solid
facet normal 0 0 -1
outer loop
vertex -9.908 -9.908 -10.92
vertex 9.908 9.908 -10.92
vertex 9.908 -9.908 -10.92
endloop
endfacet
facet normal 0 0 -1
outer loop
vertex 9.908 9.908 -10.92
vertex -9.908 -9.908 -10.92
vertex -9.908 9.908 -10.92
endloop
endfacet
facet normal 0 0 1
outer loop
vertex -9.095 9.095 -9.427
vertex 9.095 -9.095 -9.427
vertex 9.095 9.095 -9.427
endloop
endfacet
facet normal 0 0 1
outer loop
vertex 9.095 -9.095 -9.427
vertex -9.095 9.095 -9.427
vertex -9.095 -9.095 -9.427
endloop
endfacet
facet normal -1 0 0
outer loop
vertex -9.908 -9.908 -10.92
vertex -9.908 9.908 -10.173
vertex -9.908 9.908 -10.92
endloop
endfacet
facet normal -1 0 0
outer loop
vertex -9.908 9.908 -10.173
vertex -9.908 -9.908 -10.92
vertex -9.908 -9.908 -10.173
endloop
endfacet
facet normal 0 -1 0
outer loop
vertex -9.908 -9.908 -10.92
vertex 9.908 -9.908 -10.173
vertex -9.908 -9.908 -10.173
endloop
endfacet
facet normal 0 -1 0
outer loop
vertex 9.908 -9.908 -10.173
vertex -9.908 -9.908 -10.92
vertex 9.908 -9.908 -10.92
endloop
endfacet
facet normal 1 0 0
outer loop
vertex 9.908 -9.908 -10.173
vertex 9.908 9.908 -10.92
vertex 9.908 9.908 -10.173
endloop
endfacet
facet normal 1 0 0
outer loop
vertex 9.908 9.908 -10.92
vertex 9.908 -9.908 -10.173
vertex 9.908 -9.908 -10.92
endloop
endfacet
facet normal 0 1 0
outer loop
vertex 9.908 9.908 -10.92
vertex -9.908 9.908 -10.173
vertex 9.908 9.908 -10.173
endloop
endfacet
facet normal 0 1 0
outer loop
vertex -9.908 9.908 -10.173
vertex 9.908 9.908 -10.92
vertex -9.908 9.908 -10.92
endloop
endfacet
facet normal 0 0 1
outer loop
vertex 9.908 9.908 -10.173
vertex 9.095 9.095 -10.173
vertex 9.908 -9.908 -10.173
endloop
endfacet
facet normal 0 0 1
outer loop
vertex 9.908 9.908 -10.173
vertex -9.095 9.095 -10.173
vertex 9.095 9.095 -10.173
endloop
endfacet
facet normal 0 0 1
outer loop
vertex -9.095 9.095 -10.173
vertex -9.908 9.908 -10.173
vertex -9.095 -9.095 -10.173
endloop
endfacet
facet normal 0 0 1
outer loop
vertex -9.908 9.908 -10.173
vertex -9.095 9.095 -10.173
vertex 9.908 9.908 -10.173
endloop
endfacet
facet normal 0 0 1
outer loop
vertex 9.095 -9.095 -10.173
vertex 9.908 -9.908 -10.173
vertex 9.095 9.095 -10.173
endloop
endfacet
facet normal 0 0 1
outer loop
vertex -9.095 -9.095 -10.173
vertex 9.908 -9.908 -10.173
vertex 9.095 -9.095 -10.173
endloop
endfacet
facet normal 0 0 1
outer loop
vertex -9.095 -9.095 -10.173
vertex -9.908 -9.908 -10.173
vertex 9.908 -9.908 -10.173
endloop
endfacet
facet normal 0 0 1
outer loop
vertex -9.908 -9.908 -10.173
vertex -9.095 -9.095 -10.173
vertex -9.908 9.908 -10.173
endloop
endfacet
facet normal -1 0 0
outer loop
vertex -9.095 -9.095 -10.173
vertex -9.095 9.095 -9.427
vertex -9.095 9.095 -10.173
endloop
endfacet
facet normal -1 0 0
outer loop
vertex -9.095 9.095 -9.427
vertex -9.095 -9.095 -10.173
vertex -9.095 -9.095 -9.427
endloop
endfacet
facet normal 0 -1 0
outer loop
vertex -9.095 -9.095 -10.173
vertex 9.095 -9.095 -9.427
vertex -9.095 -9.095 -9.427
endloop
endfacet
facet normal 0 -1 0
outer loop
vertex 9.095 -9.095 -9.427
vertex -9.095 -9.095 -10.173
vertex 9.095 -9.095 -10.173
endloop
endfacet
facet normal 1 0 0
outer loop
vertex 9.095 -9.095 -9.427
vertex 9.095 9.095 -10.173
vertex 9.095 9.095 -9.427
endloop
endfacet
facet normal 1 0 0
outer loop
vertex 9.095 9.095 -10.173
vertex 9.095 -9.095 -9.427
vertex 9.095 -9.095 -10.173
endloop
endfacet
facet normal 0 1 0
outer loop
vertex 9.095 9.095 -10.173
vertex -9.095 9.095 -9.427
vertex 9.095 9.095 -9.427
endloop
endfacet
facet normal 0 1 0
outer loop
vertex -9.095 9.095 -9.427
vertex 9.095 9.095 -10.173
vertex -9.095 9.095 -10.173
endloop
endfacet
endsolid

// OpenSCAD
arete = 21.949;
paroi = 1.5;
echelleReductionAjustementBouchon = 0.96;
r = 0.19; // résolution d'impression sur l'axe Z

//cube_creux();
//decoupe_bouchon();
//corps_ouvert();
bouchon();
//trou();

module corps_ouvert() {
    //rotate([180, 0, 0])
	difference() {
		cube_creux();
		decoupe_bouchon();
	}
}

module bouchon() {
    rotate([180, 0, 0])
	scale([echelleReductionAjustementBouchon, echelleReductionAjustementBouchon, 0.995])
	difference () {
        intersection() {
            cube_creux();
            decoupe_bouchon(echelleReductionAjustementBouchon);
        }
	}
}

module cube_creux() {
	difference() {
        cube(arete, center=true);
        cube(arete-2*paroi, center=true);
	}
}

module decoupe_bouchon(scale=1) {
    distance = arete/2;
	rotate([0,0,45]) translate([0,0,distance])
		cylinder(paroi, r=arete*0.665, $fn=4, center=true);
	rotate([0,0,45]) translate([0,0,distance-paroi])
		cylinder(paroi, r=(arete-paroi/2)*0.632, $fn=4, center=true);
}
